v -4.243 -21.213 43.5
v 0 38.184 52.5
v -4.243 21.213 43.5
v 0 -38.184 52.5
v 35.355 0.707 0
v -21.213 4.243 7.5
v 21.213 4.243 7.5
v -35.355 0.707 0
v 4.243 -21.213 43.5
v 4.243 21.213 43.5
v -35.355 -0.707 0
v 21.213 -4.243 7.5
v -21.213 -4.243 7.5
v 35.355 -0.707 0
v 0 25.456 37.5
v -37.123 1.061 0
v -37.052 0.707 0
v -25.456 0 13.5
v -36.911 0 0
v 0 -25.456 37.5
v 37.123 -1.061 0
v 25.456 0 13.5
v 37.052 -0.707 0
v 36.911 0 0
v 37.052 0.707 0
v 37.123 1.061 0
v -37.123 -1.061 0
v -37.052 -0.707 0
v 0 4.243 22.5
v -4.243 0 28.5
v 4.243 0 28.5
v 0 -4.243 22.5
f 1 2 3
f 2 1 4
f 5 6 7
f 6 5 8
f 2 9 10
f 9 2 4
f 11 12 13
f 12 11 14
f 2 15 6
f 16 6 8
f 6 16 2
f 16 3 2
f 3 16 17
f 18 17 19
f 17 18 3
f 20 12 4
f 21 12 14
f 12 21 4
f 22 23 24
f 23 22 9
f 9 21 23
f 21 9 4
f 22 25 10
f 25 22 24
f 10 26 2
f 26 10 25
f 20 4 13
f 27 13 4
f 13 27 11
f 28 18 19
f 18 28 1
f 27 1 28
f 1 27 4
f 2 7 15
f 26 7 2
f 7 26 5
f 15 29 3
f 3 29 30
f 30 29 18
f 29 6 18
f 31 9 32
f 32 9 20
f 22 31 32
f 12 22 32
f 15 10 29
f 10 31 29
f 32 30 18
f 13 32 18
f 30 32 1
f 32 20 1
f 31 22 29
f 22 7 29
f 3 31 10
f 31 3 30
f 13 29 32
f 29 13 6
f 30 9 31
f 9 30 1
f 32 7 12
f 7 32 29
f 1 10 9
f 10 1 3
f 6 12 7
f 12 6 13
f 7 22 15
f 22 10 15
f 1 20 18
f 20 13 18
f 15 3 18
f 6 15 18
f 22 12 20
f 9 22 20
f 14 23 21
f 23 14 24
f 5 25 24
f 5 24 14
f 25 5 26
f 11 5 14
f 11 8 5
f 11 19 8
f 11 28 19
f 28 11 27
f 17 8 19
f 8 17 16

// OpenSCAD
/*

A toroidal polyhedra from McCooey's "Visual Polyhedra" site - http://dmccooey.com/polyhedra/ 

It is described as: Regular Map {4,6}_10 (Schulte & Wills)

------------------
http://dmccooey.com/polyhedra/Regular_4_6_10.html



Vertices:
20  (4[6] + 4[6] + 12[6])
Faces:
30  ({12 + 6} rectangles + 12 isosceles trapezoids)
Edges:
60  (5 different lengths)
Symmetry:
Full Tetrahedral  (Td)
Dual Toroid:
Regular Map {6,4}10



References:
[1]
Egon Schulte and Jorg M. Wills, On Coxeter's regular skew
polyhedra, Discrete Mathematics 60 (1986), 253-262.
------------------


PCM April 2018
*/


difference()
{


translate([0,0,25.5])
scale(3)

// cut 1.5 mm off bottom - reduce raft to model
// spacing to 0.25 mm
  //rotate([acos(1/sqrt(3)),180,0])
  rotate([0,0,135])

polyhedron(R_4_6_10_cords,R_4_6_10_faces);
translate([0,0,-50])
cube([100,100,100],center=true);
}


//Regular Map {4,6}_10 (Schulte & Wills)

   R_4_6_10_cords = [
      [ 9.0, -9.0,  9.0],
      [ 9.0,  9.0, -9.0],
      [-9.0,  9.0,  9.0],
      [-9.0, -9.0, -9.0],
      [ 6.0, -4.0,  6.0],
      [ 6.0,  4.0, -6.0],
      [-6.0,  4.0,  6.0],
      [-6.0, -4.0, -6.0],
      [ 6.0, -6.0,  4.0],
      [ 6.0,  6.0, -4.0],
      [-6.0,  6.0,  4.0],
      [-6.0, -6.0, -4.0],
      [ 4.0, -6.0,  6.0],
      [ 4.0,  6.0, -6.0],
      [-4.0,  6.0,  6.0],
      [-4.0, -6.0, -6.0],
      [ 1.0,  1.0,  1.0],
      [ 1.0, -1.0, -1.0],
      [-1.0, -1.0,  1.0],
      [-1.0,  1.0, -1.0],
    ];


   R_4_6_10_faces = [
     [  0,  2, 14,  4],
     [  1,  3, 15,  5],
     [  2,  0, 12,  6],
     [  3,  1, 13,  7],
     [  0,  1,  5,  8],
     [  1,  0,  4,  9],
     [  2,  3,  7, 10],
     [  3,  2,  6, 11],
     [  0,  3, 11, 12],
     [  1,  2, 10, 13],
     [  2,  1,  9, 14],
     [  3,  0,  8, 15],
     [ 16, 17,  8,  4],
     [ 17, 16,  9,  5],
     [ 18, 19, 10,  6],
     [ 19, 18, 11,  7],
     [ 17, 18, 12,  8],
     [ 16, 19, 13,  9],
     [ 19, 16, 14, 10],
     [ 18, 17, 15, 11],
     [ 18, 16,  4, 12],
     [ 19, 17,  5, 13],
     [ 16, 18,  6, 14],
     [ 17, 19,  7, 15],
     [ 14,  6, 12,  4],
     [ 15,  7, 13,  5],
     [ 12, 11, 15,  8],
     [ 13, 10, 14,  9],
     [  8,  5,  9,  4],
     [ 10,  7, 11,  6],
      ];
